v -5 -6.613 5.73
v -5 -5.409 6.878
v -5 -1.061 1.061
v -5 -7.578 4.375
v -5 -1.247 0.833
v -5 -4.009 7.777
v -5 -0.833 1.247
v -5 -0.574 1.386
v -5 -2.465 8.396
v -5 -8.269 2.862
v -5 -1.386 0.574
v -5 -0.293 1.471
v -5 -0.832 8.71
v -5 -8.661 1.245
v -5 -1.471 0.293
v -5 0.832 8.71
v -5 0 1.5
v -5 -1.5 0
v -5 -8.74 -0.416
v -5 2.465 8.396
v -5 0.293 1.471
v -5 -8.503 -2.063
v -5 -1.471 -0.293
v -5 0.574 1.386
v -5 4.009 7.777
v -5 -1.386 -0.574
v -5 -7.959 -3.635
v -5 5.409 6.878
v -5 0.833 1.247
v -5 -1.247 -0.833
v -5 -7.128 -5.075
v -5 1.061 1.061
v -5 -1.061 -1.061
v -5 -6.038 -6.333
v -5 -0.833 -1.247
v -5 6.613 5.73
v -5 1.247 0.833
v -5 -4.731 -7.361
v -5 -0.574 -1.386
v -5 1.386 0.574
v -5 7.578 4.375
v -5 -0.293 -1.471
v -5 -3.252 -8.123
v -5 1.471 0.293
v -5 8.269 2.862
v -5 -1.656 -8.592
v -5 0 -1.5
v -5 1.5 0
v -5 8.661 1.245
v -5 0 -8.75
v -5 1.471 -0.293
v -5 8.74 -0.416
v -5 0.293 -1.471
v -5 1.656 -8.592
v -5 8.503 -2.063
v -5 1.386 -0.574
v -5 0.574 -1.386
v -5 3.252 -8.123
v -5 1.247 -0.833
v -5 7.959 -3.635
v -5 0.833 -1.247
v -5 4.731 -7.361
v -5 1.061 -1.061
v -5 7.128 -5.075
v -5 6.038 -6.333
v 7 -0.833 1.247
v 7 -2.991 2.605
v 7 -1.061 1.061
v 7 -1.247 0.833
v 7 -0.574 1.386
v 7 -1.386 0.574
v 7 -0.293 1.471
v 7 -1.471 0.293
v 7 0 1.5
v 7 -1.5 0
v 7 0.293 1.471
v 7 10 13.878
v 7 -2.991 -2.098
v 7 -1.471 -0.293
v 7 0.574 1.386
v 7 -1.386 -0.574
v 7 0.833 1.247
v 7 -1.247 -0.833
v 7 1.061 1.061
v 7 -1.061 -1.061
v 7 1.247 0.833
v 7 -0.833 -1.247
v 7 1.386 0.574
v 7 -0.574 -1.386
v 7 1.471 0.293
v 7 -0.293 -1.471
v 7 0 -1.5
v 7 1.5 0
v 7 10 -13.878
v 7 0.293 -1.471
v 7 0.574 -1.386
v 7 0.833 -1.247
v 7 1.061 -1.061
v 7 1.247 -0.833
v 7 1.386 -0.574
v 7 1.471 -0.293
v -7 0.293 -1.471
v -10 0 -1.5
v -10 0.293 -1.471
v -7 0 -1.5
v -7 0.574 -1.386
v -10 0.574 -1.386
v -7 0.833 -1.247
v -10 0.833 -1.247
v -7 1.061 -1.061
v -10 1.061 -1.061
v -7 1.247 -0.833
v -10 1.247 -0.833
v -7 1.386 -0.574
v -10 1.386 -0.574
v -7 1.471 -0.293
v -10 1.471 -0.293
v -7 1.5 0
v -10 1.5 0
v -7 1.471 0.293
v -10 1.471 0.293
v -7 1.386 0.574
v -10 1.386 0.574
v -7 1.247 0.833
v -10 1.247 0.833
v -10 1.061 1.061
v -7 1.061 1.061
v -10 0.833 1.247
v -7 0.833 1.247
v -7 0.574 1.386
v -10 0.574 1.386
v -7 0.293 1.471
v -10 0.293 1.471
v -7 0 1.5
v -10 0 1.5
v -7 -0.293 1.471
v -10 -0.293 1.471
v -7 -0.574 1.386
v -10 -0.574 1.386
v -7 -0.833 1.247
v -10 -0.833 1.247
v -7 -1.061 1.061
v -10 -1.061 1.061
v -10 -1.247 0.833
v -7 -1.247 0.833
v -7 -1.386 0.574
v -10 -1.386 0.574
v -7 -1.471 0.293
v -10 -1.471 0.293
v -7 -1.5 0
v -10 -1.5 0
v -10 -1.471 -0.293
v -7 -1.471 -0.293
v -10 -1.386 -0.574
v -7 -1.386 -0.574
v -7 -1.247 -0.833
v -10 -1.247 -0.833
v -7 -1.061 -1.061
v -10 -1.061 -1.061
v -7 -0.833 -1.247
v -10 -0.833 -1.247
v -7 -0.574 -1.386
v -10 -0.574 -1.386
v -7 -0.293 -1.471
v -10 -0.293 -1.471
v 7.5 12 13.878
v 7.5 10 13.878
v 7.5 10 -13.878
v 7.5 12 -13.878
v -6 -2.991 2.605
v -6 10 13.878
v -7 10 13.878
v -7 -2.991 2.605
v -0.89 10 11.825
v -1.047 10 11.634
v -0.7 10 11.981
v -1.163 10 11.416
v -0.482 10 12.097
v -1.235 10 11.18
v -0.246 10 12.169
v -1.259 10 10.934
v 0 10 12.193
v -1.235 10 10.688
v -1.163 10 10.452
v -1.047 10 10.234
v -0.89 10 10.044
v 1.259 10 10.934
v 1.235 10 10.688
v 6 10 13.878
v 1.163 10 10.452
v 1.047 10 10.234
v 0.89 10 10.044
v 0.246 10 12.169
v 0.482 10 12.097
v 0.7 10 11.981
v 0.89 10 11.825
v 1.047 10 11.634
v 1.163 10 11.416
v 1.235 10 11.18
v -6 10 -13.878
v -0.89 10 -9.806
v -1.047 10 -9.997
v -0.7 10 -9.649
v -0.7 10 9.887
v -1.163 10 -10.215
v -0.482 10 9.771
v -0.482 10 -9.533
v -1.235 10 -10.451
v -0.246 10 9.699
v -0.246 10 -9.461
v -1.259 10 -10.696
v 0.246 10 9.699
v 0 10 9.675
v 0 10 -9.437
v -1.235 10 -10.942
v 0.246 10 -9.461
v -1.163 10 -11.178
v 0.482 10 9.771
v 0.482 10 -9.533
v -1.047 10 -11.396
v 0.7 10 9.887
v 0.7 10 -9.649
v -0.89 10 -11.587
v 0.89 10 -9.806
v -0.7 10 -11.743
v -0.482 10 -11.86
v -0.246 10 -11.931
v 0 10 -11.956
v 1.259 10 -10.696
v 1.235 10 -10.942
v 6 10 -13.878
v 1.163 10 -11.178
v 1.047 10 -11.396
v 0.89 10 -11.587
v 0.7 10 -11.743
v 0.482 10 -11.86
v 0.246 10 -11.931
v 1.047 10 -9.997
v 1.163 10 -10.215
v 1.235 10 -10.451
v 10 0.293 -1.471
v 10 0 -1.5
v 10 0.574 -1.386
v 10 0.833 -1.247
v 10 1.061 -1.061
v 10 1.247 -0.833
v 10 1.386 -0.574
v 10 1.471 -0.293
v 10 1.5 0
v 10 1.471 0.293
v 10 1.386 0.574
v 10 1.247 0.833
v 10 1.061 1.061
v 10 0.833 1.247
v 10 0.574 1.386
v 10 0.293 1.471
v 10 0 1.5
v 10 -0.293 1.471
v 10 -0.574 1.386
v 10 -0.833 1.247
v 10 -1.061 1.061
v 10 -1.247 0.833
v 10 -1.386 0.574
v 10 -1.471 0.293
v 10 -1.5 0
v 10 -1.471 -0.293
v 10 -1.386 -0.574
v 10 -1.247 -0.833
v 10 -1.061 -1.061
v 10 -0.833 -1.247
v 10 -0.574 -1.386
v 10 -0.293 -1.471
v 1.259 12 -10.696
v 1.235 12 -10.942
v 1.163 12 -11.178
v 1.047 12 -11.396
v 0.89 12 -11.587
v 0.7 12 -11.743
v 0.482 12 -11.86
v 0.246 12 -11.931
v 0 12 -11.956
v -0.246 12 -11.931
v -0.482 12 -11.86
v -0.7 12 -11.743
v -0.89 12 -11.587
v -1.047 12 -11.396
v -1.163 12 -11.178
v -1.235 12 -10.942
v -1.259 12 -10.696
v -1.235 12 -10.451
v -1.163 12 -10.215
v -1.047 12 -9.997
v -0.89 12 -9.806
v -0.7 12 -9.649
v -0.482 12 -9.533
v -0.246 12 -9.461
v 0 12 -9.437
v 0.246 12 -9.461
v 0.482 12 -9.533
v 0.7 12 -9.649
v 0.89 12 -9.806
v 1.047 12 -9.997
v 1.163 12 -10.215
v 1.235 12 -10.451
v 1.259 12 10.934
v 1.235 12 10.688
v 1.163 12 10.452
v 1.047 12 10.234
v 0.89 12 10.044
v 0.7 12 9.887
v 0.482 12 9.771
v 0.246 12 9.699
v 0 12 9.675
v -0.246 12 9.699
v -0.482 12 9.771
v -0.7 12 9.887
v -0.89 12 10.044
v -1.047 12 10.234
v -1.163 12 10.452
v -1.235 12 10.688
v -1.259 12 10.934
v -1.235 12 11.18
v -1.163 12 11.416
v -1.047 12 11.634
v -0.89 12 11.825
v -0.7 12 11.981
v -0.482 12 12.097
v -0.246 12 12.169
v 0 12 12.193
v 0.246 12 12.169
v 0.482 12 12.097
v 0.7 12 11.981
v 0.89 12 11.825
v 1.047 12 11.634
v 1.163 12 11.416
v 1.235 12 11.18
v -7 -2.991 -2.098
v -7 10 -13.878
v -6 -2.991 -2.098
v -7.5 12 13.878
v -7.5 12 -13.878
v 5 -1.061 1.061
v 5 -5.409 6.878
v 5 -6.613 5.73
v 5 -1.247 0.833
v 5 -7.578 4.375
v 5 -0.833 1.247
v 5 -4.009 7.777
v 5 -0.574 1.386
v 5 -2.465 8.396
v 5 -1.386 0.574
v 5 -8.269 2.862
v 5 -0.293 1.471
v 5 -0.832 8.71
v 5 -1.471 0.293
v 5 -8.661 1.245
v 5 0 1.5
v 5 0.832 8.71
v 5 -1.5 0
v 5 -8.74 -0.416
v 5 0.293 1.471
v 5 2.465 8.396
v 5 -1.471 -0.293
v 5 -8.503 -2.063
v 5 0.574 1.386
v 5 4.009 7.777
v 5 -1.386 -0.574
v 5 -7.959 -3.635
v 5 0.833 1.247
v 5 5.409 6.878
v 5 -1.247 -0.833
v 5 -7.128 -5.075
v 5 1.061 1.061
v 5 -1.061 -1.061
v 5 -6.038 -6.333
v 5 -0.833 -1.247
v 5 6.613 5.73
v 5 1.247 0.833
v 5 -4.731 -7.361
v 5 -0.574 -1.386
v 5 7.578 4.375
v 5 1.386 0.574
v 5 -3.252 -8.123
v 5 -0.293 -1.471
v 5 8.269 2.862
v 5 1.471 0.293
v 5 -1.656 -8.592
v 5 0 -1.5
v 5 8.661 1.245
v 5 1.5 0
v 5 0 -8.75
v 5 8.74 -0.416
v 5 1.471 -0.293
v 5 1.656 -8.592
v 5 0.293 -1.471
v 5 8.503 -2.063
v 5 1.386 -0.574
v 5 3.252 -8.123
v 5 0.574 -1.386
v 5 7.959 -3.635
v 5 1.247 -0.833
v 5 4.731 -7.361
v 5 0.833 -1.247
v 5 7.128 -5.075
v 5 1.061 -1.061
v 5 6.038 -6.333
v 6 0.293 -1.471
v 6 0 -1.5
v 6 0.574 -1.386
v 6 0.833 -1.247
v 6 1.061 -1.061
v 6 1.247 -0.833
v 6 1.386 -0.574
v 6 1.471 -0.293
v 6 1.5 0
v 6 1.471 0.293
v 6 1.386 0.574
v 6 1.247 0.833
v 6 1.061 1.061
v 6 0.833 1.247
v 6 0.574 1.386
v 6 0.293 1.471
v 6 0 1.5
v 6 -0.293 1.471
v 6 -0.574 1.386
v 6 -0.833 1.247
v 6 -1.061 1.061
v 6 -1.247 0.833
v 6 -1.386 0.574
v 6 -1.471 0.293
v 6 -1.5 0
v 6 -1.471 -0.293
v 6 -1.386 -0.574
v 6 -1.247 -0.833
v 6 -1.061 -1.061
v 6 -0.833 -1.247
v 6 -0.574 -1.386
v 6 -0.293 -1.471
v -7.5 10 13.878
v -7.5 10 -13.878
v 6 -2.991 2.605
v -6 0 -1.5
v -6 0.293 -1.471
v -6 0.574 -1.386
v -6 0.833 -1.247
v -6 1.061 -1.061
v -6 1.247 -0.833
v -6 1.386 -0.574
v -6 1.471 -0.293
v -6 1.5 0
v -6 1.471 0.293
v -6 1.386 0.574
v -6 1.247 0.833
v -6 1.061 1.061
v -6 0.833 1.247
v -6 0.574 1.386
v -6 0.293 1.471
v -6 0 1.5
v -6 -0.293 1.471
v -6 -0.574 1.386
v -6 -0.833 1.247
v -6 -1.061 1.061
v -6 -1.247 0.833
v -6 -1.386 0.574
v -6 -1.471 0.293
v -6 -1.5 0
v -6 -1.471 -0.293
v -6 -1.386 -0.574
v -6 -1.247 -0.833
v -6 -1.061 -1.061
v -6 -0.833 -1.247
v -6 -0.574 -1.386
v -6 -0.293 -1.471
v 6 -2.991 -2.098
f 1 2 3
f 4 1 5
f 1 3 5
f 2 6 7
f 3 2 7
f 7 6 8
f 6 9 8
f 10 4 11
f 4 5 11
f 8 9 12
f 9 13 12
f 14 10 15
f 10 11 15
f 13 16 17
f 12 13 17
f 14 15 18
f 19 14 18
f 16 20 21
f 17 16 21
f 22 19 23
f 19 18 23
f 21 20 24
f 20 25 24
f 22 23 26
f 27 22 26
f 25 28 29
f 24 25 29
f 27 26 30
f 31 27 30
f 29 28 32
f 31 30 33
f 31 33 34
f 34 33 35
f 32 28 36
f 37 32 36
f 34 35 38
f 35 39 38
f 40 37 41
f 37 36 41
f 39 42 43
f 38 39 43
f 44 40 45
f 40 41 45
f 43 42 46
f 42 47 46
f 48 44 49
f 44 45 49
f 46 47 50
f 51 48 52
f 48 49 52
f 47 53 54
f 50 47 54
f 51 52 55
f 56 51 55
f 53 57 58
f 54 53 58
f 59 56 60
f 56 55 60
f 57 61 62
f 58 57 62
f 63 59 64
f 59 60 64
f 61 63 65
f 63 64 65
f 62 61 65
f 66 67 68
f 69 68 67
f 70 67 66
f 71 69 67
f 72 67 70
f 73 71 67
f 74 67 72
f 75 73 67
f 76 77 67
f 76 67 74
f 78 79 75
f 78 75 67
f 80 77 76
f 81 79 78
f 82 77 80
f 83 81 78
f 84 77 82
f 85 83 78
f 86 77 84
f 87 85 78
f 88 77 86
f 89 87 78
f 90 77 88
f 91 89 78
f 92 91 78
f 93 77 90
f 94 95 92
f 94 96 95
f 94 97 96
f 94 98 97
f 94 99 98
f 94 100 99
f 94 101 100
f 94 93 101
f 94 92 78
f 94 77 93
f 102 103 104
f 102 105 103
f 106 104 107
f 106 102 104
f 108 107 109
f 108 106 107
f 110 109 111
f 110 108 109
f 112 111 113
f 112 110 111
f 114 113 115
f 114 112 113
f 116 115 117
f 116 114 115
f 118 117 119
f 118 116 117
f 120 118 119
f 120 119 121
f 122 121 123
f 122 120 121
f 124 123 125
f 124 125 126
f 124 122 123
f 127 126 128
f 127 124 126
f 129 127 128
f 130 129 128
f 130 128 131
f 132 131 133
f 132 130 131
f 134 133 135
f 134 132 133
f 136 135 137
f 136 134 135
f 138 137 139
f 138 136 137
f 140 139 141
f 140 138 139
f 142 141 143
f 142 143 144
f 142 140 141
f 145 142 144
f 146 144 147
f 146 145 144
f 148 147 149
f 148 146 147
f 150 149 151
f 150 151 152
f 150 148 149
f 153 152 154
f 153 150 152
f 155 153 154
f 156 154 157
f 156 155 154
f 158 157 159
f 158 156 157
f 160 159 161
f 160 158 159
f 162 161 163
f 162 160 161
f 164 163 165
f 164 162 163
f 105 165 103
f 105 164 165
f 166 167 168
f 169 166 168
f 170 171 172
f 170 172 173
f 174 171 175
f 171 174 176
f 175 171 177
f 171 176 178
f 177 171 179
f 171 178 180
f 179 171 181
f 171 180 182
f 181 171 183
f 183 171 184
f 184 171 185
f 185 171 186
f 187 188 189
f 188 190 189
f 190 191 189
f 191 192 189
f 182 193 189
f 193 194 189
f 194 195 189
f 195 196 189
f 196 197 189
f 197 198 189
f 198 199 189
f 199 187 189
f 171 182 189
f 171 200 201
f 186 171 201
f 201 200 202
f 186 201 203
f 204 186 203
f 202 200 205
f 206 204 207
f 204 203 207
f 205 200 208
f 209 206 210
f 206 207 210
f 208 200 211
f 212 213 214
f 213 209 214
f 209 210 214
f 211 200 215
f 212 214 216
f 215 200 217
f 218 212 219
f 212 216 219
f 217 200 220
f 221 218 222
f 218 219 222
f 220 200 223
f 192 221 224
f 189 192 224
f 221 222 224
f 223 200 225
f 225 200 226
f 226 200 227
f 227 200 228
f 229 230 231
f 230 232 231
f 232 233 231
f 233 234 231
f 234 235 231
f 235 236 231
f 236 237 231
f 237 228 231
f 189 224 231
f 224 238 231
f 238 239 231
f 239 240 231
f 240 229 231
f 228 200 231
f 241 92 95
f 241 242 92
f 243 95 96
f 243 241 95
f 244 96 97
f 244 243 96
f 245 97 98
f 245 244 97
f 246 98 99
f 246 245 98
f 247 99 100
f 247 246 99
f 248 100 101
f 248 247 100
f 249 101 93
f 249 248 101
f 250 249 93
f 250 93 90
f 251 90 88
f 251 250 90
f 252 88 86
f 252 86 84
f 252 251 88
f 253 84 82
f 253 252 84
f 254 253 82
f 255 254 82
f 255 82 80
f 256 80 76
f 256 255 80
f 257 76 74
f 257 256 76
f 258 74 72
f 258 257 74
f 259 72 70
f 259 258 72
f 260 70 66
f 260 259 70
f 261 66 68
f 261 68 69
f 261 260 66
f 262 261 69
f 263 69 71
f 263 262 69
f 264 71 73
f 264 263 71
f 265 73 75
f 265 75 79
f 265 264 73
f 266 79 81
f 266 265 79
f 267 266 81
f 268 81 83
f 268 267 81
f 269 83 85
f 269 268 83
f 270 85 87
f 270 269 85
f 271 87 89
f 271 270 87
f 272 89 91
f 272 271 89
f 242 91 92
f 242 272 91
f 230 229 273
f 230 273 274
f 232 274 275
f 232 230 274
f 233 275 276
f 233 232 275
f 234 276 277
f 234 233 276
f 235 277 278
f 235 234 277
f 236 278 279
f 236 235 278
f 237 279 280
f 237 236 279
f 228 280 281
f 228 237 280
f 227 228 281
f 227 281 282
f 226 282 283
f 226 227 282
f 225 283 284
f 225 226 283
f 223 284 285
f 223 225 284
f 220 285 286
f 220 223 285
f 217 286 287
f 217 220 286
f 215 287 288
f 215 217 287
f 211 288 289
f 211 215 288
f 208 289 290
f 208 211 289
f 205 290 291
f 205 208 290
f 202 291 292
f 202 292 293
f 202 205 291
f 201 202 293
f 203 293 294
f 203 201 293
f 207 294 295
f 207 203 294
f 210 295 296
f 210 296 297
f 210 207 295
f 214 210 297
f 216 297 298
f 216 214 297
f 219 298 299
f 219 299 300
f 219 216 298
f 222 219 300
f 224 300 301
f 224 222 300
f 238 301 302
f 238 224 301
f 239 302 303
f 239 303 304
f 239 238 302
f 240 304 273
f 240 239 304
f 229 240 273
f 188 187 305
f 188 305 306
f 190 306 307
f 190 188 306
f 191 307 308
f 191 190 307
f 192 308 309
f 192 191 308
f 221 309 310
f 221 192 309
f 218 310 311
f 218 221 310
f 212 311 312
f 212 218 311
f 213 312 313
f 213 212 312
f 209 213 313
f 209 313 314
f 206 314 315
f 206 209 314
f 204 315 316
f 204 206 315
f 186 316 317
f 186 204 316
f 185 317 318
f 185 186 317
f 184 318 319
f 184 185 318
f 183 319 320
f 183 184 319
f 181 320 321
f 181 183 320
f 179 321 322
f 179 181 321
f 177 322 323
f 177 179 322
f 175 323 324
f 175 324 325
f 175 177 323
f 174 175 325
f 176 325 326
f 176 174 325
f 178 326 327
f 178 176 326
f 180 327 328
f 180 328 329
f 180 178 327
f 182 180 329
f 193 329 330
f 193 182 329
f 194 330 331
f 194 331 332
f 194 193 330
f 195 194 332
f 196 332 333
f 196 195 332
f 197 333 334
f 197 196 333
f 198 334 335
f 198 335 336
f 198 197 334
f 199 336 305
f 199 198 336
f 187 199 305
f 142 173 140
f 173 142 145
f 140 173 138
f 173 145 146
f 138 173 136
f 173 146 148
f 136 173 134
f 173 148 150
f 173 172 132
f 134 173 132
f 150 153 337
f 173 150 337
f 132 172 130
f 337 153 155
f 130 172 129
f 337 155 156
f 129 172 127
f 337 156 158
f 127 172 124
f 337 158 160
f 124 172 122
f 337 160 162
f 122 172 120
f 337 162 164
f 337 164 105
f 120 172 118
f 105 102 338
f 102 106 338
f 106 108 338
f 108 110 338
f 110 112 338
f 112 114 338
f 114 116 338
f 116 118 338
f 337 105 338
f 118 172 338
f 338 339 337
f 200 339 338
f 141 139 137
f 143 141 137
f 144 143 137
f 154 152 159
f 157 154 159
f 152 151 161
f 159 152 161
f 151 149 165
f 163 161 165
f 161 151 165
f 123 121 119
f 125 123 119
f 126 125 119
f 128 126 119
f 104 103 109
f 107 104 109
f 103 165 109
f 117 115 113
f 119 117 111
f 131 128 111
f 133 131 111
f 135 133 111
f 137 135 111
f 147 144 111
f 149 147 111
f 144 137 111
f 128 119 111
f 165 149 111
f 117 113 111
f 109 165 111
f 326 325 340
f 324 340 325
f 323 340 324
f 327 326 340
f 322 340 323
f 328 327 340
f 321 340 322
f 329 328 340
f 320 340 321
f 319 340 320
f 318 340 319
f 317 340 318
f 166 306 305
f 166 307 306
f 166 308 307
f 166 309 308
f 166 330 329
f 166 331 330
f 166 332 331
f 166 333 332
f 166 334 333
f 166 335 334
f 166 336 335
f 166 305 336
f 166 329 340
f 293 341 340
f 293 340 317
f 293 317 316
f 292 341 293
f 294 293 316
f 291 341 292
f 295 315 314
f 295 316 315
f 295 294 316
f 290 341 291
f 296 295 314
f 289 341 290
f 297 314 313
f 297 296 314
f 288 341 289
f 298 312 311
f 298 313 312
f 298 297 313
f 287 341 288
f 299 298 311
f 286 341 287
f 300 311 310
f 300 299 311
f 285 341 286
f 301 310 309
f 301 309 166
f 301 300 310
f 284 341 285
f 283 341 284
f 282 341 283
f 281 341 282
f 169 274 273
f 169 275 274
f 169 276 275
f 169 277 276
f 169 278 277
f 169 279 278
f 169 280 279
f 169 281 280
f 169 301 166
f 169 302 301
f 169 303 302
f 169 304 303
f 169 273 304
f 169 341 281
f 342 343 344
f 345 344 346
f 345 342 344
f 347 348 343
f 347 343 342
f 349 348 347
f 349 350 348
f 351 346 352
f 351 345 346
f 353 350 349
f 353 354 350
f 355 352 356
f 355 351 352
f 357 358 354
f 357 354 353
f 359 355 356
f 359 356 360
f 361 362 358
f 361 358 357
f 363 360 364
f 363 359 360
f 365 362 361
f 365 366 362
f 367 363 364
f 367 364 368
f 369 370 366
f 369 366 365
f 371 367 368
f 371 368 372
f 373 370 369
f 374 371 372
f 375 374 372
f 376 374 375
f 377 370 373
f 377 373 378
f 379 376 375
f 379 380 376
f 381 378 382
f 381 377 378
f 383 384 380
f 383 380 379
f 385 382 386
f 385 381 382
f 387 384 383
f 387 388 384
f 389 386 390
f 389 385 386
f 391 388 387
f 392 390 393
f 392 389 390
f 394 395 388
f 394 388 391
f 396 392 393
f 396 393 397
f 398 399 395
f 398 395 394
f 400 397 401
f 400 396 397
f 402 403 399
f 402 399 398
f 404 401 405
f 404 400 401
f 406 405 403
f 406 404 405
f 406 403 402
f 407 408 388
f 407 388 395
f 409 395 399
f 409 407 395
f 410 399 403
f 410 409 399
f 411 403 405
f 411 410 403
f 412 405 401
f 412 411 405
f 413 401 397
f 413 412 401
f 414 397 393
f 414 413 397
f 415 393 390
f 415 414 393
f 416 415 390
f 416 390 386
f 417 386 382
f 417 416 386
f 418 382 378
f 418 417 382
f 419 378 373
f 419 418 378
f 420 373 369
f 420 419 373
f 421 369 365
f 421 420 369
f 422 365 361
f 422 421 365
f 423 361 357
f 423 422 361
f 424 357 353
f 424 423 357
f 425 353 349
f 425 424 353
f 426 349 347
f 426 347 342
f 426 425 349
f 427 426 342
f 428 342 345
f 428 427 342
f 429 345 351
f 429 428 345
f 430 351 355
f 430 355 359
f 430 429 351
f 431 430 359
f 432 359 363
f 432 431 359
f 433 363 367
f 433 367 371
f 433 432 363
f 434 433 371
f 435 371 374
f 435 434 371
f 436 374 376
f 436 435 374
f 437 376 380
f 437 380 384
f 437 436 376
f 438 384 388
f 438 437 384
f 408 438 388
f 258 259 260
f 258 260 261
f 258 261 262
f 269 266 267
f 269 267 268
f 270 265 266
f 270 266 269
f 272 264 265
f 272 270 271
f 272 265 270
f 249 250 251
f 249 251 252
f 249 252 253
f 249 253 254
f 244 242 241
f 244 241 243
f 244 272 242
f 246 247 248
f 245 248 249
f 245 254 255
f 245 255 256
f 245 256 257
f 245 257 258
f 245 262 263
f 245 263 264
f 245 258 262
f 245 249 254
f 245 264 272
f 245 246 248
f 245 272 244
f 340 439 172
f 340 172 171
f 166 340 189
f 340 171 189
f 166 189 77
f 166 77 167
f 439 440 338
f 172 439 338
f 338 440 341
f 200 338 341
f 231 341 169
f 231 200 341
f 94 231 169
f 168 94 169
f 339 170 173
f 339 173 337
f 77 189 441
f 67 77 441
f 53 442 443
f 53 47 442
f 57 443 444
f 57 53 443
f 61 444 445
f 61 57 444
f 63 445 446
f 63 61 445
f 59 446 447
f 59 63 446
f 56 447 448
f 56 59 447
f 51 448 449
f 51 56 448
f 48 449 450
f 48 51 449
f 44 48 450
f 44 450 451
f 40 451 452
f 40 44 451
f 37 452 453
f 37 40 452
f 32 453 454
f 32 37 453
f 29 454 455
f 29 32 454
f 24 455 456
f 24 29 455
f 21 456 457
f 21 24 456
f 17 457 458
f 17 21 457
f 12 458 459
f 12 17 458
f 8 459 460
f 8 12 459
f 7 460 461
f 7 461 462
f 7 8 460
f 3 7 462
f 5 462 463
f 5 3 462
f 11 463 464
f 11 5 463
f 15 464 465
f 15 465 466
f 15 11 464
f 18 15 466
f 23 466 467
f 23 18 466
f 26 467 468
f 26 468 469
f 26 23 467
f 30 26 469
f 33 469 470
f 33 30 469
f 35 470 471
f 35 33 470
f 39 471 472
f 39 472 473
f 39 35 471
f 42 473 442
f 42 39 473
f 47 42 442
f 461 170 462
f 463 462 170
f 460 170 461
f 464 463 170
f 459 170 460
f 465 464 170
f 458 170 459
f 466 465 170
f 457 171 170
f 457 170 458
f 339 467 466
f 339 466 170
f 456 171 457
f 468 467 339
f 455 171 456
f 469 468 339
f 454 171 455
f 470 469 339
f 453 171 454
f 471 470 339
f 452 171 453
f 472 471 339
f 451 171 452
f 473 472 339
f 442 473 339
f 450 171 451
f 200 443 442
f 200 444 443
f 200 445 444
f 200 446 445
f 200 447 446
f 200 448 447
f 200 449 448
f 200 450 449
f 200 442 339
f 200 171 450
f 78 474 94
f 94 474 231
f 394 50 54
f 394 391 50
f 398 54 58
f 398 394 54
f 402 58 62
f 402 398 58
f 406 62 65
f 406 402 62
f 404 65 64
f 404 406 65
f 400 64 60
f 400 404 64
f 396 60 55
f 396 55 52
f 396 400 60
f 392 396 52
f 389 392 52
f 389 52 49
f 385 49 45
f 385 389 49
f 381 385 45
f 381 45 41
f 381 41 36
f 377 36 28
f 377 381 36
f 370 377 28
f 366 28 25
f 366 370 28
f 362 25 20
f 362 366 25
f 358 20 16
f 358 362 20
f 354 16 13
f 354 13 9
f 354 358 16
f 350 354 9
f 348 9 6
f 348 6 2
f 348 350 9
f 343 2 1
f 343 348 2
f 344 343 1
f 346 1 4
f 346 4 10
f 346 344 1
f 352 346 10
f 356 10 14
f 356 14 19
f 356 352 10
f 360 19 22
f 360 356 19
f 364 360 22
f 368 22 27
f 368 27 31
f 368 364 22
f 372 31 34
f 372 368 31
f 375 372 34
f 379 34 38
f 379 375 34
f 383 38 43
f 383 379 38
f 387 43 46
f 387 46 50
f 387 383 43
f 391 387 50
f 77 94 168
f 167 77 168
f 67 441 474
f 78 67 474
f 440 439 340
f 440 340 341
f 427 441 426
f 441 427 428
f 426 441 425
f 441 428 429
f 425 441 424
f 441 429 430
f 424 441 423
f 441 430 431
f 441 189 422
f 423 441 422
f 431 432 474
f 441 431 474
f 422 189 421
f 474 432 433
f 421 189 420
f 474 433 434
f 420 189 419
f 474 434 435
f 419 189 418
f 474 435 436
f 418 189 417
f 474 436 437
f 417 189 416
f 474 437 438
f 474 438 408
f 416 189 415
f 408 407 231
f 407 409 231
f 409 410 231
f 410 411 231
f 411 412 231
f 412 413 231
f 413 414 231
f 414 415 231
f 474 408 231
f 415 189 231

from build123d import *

# Parameters (mm, degrees)
SKETCH1_R           = 8.75
SKETCH1_R_2         = 1.5
BOSS_EXTRUDE1_DEPTH = 5
SKETCH1_2_R         = 1.5
BOSS_EXTRUDE2_DEPTH = 10
BOSS_EXTRUDE3_START = 10
SKETCH2_W           = 15
SKETCH2_H           = 27.755893748
SKETCH2_R           = 1.259283935
BOSS_EXTRUDE3_DEPTH = 2
BOSS_EXTRUDE4_START = 6
BOSS_EXTRUDE4_DEPTH = 1
BOSS_EXTRUDE5_START = -6
BOSS_EXTRUDE5_DEPTH = 1


with BuildPart() as part:
    # Sketch1 → Boss-Extrude1 (new, symmetric)
    with BuildSketch(Plane(origin=(0, 0, 0), x_dir=(0, 0, -1), z_dir=(1, 0, 0))):
        Circle(SKETCH1_R)
        Circle(SKETCH1_R_2, mode=Mode.SUBTRACT)
    extrude(amount=BOSS_EXTRUDE1_DEPTH, both=True)

    # Sketch1<2> → Boss-Extrude2 (add, symmetric)
    with BuildSketch(Plane(origin=(0, 0, 0), x_dir=(0, 0, -1), z_dir=(1, 0, 0))):
        Circle(SKETCH1_2_R)
    extrude(amount=BOSS_EXTRUDE2_DEPTH, both=True)



with BuildPart() as body_2:
    # Sketch2 → Boss-Extrude3 (new body)
    with BuildSketch(Plane(origin=(0, 0, 0), x_dir=(1, 0, 0), z_dir=(0, 1, 0)).offset(BOSS_EXTRUDE3_START)):
        Rectangle(SKETCH2_W, SKETCH2_H)
        with Locations((0, 10.696409263)):
            Circle(SKETCH2_R, mode=Mode.SUBTRACT)
        with Locations((0, -10.934061862)):
            Circle(SKETCH2_R, mode=Mode.SUBTRACT)
    extrude(amount=BOSS_EXTRUDE3_DEPTH)


with BuildPart() as part_1:
    add(part.part)

    add(body_2.part)  # Boss-Extrude4 merges body 2
    # Sketch3 → Boss-Extrude4 (add)
    with BuildSketch(Plane(origin=(0, 0, 0), x_dir=(0, 0, -1), z_dir=(1, 0, 0)).offset(BOSS_EXTRUDE4_START)):
        Polygon((-13.877946874, 10), (-2.605119046, -2.991355361), (2.097655879, -2.991355361), (13.877946874, 10), align=None)
    extrude(amount=BOSS_EXTRUDE4_DEPTH)

    # Sketch3<2> → Boss-Extrude5 (add)
    with BuildSketch(Plane(origin=(0, 0, 0), x_dir=(0, 0, -1), z_dir=(1, 0, 0)).offset(BOSS_EXTRUDE5_START)):
        Polygon((-13.877946874, 10), (-2.605119046, -2.991355361), (2.097655879, -2.991355361), (13.877946874, 10), align=None)
    extrude(amount=-BOSS_EXTRUDE5_DEPTH)


solid = part_1.part
